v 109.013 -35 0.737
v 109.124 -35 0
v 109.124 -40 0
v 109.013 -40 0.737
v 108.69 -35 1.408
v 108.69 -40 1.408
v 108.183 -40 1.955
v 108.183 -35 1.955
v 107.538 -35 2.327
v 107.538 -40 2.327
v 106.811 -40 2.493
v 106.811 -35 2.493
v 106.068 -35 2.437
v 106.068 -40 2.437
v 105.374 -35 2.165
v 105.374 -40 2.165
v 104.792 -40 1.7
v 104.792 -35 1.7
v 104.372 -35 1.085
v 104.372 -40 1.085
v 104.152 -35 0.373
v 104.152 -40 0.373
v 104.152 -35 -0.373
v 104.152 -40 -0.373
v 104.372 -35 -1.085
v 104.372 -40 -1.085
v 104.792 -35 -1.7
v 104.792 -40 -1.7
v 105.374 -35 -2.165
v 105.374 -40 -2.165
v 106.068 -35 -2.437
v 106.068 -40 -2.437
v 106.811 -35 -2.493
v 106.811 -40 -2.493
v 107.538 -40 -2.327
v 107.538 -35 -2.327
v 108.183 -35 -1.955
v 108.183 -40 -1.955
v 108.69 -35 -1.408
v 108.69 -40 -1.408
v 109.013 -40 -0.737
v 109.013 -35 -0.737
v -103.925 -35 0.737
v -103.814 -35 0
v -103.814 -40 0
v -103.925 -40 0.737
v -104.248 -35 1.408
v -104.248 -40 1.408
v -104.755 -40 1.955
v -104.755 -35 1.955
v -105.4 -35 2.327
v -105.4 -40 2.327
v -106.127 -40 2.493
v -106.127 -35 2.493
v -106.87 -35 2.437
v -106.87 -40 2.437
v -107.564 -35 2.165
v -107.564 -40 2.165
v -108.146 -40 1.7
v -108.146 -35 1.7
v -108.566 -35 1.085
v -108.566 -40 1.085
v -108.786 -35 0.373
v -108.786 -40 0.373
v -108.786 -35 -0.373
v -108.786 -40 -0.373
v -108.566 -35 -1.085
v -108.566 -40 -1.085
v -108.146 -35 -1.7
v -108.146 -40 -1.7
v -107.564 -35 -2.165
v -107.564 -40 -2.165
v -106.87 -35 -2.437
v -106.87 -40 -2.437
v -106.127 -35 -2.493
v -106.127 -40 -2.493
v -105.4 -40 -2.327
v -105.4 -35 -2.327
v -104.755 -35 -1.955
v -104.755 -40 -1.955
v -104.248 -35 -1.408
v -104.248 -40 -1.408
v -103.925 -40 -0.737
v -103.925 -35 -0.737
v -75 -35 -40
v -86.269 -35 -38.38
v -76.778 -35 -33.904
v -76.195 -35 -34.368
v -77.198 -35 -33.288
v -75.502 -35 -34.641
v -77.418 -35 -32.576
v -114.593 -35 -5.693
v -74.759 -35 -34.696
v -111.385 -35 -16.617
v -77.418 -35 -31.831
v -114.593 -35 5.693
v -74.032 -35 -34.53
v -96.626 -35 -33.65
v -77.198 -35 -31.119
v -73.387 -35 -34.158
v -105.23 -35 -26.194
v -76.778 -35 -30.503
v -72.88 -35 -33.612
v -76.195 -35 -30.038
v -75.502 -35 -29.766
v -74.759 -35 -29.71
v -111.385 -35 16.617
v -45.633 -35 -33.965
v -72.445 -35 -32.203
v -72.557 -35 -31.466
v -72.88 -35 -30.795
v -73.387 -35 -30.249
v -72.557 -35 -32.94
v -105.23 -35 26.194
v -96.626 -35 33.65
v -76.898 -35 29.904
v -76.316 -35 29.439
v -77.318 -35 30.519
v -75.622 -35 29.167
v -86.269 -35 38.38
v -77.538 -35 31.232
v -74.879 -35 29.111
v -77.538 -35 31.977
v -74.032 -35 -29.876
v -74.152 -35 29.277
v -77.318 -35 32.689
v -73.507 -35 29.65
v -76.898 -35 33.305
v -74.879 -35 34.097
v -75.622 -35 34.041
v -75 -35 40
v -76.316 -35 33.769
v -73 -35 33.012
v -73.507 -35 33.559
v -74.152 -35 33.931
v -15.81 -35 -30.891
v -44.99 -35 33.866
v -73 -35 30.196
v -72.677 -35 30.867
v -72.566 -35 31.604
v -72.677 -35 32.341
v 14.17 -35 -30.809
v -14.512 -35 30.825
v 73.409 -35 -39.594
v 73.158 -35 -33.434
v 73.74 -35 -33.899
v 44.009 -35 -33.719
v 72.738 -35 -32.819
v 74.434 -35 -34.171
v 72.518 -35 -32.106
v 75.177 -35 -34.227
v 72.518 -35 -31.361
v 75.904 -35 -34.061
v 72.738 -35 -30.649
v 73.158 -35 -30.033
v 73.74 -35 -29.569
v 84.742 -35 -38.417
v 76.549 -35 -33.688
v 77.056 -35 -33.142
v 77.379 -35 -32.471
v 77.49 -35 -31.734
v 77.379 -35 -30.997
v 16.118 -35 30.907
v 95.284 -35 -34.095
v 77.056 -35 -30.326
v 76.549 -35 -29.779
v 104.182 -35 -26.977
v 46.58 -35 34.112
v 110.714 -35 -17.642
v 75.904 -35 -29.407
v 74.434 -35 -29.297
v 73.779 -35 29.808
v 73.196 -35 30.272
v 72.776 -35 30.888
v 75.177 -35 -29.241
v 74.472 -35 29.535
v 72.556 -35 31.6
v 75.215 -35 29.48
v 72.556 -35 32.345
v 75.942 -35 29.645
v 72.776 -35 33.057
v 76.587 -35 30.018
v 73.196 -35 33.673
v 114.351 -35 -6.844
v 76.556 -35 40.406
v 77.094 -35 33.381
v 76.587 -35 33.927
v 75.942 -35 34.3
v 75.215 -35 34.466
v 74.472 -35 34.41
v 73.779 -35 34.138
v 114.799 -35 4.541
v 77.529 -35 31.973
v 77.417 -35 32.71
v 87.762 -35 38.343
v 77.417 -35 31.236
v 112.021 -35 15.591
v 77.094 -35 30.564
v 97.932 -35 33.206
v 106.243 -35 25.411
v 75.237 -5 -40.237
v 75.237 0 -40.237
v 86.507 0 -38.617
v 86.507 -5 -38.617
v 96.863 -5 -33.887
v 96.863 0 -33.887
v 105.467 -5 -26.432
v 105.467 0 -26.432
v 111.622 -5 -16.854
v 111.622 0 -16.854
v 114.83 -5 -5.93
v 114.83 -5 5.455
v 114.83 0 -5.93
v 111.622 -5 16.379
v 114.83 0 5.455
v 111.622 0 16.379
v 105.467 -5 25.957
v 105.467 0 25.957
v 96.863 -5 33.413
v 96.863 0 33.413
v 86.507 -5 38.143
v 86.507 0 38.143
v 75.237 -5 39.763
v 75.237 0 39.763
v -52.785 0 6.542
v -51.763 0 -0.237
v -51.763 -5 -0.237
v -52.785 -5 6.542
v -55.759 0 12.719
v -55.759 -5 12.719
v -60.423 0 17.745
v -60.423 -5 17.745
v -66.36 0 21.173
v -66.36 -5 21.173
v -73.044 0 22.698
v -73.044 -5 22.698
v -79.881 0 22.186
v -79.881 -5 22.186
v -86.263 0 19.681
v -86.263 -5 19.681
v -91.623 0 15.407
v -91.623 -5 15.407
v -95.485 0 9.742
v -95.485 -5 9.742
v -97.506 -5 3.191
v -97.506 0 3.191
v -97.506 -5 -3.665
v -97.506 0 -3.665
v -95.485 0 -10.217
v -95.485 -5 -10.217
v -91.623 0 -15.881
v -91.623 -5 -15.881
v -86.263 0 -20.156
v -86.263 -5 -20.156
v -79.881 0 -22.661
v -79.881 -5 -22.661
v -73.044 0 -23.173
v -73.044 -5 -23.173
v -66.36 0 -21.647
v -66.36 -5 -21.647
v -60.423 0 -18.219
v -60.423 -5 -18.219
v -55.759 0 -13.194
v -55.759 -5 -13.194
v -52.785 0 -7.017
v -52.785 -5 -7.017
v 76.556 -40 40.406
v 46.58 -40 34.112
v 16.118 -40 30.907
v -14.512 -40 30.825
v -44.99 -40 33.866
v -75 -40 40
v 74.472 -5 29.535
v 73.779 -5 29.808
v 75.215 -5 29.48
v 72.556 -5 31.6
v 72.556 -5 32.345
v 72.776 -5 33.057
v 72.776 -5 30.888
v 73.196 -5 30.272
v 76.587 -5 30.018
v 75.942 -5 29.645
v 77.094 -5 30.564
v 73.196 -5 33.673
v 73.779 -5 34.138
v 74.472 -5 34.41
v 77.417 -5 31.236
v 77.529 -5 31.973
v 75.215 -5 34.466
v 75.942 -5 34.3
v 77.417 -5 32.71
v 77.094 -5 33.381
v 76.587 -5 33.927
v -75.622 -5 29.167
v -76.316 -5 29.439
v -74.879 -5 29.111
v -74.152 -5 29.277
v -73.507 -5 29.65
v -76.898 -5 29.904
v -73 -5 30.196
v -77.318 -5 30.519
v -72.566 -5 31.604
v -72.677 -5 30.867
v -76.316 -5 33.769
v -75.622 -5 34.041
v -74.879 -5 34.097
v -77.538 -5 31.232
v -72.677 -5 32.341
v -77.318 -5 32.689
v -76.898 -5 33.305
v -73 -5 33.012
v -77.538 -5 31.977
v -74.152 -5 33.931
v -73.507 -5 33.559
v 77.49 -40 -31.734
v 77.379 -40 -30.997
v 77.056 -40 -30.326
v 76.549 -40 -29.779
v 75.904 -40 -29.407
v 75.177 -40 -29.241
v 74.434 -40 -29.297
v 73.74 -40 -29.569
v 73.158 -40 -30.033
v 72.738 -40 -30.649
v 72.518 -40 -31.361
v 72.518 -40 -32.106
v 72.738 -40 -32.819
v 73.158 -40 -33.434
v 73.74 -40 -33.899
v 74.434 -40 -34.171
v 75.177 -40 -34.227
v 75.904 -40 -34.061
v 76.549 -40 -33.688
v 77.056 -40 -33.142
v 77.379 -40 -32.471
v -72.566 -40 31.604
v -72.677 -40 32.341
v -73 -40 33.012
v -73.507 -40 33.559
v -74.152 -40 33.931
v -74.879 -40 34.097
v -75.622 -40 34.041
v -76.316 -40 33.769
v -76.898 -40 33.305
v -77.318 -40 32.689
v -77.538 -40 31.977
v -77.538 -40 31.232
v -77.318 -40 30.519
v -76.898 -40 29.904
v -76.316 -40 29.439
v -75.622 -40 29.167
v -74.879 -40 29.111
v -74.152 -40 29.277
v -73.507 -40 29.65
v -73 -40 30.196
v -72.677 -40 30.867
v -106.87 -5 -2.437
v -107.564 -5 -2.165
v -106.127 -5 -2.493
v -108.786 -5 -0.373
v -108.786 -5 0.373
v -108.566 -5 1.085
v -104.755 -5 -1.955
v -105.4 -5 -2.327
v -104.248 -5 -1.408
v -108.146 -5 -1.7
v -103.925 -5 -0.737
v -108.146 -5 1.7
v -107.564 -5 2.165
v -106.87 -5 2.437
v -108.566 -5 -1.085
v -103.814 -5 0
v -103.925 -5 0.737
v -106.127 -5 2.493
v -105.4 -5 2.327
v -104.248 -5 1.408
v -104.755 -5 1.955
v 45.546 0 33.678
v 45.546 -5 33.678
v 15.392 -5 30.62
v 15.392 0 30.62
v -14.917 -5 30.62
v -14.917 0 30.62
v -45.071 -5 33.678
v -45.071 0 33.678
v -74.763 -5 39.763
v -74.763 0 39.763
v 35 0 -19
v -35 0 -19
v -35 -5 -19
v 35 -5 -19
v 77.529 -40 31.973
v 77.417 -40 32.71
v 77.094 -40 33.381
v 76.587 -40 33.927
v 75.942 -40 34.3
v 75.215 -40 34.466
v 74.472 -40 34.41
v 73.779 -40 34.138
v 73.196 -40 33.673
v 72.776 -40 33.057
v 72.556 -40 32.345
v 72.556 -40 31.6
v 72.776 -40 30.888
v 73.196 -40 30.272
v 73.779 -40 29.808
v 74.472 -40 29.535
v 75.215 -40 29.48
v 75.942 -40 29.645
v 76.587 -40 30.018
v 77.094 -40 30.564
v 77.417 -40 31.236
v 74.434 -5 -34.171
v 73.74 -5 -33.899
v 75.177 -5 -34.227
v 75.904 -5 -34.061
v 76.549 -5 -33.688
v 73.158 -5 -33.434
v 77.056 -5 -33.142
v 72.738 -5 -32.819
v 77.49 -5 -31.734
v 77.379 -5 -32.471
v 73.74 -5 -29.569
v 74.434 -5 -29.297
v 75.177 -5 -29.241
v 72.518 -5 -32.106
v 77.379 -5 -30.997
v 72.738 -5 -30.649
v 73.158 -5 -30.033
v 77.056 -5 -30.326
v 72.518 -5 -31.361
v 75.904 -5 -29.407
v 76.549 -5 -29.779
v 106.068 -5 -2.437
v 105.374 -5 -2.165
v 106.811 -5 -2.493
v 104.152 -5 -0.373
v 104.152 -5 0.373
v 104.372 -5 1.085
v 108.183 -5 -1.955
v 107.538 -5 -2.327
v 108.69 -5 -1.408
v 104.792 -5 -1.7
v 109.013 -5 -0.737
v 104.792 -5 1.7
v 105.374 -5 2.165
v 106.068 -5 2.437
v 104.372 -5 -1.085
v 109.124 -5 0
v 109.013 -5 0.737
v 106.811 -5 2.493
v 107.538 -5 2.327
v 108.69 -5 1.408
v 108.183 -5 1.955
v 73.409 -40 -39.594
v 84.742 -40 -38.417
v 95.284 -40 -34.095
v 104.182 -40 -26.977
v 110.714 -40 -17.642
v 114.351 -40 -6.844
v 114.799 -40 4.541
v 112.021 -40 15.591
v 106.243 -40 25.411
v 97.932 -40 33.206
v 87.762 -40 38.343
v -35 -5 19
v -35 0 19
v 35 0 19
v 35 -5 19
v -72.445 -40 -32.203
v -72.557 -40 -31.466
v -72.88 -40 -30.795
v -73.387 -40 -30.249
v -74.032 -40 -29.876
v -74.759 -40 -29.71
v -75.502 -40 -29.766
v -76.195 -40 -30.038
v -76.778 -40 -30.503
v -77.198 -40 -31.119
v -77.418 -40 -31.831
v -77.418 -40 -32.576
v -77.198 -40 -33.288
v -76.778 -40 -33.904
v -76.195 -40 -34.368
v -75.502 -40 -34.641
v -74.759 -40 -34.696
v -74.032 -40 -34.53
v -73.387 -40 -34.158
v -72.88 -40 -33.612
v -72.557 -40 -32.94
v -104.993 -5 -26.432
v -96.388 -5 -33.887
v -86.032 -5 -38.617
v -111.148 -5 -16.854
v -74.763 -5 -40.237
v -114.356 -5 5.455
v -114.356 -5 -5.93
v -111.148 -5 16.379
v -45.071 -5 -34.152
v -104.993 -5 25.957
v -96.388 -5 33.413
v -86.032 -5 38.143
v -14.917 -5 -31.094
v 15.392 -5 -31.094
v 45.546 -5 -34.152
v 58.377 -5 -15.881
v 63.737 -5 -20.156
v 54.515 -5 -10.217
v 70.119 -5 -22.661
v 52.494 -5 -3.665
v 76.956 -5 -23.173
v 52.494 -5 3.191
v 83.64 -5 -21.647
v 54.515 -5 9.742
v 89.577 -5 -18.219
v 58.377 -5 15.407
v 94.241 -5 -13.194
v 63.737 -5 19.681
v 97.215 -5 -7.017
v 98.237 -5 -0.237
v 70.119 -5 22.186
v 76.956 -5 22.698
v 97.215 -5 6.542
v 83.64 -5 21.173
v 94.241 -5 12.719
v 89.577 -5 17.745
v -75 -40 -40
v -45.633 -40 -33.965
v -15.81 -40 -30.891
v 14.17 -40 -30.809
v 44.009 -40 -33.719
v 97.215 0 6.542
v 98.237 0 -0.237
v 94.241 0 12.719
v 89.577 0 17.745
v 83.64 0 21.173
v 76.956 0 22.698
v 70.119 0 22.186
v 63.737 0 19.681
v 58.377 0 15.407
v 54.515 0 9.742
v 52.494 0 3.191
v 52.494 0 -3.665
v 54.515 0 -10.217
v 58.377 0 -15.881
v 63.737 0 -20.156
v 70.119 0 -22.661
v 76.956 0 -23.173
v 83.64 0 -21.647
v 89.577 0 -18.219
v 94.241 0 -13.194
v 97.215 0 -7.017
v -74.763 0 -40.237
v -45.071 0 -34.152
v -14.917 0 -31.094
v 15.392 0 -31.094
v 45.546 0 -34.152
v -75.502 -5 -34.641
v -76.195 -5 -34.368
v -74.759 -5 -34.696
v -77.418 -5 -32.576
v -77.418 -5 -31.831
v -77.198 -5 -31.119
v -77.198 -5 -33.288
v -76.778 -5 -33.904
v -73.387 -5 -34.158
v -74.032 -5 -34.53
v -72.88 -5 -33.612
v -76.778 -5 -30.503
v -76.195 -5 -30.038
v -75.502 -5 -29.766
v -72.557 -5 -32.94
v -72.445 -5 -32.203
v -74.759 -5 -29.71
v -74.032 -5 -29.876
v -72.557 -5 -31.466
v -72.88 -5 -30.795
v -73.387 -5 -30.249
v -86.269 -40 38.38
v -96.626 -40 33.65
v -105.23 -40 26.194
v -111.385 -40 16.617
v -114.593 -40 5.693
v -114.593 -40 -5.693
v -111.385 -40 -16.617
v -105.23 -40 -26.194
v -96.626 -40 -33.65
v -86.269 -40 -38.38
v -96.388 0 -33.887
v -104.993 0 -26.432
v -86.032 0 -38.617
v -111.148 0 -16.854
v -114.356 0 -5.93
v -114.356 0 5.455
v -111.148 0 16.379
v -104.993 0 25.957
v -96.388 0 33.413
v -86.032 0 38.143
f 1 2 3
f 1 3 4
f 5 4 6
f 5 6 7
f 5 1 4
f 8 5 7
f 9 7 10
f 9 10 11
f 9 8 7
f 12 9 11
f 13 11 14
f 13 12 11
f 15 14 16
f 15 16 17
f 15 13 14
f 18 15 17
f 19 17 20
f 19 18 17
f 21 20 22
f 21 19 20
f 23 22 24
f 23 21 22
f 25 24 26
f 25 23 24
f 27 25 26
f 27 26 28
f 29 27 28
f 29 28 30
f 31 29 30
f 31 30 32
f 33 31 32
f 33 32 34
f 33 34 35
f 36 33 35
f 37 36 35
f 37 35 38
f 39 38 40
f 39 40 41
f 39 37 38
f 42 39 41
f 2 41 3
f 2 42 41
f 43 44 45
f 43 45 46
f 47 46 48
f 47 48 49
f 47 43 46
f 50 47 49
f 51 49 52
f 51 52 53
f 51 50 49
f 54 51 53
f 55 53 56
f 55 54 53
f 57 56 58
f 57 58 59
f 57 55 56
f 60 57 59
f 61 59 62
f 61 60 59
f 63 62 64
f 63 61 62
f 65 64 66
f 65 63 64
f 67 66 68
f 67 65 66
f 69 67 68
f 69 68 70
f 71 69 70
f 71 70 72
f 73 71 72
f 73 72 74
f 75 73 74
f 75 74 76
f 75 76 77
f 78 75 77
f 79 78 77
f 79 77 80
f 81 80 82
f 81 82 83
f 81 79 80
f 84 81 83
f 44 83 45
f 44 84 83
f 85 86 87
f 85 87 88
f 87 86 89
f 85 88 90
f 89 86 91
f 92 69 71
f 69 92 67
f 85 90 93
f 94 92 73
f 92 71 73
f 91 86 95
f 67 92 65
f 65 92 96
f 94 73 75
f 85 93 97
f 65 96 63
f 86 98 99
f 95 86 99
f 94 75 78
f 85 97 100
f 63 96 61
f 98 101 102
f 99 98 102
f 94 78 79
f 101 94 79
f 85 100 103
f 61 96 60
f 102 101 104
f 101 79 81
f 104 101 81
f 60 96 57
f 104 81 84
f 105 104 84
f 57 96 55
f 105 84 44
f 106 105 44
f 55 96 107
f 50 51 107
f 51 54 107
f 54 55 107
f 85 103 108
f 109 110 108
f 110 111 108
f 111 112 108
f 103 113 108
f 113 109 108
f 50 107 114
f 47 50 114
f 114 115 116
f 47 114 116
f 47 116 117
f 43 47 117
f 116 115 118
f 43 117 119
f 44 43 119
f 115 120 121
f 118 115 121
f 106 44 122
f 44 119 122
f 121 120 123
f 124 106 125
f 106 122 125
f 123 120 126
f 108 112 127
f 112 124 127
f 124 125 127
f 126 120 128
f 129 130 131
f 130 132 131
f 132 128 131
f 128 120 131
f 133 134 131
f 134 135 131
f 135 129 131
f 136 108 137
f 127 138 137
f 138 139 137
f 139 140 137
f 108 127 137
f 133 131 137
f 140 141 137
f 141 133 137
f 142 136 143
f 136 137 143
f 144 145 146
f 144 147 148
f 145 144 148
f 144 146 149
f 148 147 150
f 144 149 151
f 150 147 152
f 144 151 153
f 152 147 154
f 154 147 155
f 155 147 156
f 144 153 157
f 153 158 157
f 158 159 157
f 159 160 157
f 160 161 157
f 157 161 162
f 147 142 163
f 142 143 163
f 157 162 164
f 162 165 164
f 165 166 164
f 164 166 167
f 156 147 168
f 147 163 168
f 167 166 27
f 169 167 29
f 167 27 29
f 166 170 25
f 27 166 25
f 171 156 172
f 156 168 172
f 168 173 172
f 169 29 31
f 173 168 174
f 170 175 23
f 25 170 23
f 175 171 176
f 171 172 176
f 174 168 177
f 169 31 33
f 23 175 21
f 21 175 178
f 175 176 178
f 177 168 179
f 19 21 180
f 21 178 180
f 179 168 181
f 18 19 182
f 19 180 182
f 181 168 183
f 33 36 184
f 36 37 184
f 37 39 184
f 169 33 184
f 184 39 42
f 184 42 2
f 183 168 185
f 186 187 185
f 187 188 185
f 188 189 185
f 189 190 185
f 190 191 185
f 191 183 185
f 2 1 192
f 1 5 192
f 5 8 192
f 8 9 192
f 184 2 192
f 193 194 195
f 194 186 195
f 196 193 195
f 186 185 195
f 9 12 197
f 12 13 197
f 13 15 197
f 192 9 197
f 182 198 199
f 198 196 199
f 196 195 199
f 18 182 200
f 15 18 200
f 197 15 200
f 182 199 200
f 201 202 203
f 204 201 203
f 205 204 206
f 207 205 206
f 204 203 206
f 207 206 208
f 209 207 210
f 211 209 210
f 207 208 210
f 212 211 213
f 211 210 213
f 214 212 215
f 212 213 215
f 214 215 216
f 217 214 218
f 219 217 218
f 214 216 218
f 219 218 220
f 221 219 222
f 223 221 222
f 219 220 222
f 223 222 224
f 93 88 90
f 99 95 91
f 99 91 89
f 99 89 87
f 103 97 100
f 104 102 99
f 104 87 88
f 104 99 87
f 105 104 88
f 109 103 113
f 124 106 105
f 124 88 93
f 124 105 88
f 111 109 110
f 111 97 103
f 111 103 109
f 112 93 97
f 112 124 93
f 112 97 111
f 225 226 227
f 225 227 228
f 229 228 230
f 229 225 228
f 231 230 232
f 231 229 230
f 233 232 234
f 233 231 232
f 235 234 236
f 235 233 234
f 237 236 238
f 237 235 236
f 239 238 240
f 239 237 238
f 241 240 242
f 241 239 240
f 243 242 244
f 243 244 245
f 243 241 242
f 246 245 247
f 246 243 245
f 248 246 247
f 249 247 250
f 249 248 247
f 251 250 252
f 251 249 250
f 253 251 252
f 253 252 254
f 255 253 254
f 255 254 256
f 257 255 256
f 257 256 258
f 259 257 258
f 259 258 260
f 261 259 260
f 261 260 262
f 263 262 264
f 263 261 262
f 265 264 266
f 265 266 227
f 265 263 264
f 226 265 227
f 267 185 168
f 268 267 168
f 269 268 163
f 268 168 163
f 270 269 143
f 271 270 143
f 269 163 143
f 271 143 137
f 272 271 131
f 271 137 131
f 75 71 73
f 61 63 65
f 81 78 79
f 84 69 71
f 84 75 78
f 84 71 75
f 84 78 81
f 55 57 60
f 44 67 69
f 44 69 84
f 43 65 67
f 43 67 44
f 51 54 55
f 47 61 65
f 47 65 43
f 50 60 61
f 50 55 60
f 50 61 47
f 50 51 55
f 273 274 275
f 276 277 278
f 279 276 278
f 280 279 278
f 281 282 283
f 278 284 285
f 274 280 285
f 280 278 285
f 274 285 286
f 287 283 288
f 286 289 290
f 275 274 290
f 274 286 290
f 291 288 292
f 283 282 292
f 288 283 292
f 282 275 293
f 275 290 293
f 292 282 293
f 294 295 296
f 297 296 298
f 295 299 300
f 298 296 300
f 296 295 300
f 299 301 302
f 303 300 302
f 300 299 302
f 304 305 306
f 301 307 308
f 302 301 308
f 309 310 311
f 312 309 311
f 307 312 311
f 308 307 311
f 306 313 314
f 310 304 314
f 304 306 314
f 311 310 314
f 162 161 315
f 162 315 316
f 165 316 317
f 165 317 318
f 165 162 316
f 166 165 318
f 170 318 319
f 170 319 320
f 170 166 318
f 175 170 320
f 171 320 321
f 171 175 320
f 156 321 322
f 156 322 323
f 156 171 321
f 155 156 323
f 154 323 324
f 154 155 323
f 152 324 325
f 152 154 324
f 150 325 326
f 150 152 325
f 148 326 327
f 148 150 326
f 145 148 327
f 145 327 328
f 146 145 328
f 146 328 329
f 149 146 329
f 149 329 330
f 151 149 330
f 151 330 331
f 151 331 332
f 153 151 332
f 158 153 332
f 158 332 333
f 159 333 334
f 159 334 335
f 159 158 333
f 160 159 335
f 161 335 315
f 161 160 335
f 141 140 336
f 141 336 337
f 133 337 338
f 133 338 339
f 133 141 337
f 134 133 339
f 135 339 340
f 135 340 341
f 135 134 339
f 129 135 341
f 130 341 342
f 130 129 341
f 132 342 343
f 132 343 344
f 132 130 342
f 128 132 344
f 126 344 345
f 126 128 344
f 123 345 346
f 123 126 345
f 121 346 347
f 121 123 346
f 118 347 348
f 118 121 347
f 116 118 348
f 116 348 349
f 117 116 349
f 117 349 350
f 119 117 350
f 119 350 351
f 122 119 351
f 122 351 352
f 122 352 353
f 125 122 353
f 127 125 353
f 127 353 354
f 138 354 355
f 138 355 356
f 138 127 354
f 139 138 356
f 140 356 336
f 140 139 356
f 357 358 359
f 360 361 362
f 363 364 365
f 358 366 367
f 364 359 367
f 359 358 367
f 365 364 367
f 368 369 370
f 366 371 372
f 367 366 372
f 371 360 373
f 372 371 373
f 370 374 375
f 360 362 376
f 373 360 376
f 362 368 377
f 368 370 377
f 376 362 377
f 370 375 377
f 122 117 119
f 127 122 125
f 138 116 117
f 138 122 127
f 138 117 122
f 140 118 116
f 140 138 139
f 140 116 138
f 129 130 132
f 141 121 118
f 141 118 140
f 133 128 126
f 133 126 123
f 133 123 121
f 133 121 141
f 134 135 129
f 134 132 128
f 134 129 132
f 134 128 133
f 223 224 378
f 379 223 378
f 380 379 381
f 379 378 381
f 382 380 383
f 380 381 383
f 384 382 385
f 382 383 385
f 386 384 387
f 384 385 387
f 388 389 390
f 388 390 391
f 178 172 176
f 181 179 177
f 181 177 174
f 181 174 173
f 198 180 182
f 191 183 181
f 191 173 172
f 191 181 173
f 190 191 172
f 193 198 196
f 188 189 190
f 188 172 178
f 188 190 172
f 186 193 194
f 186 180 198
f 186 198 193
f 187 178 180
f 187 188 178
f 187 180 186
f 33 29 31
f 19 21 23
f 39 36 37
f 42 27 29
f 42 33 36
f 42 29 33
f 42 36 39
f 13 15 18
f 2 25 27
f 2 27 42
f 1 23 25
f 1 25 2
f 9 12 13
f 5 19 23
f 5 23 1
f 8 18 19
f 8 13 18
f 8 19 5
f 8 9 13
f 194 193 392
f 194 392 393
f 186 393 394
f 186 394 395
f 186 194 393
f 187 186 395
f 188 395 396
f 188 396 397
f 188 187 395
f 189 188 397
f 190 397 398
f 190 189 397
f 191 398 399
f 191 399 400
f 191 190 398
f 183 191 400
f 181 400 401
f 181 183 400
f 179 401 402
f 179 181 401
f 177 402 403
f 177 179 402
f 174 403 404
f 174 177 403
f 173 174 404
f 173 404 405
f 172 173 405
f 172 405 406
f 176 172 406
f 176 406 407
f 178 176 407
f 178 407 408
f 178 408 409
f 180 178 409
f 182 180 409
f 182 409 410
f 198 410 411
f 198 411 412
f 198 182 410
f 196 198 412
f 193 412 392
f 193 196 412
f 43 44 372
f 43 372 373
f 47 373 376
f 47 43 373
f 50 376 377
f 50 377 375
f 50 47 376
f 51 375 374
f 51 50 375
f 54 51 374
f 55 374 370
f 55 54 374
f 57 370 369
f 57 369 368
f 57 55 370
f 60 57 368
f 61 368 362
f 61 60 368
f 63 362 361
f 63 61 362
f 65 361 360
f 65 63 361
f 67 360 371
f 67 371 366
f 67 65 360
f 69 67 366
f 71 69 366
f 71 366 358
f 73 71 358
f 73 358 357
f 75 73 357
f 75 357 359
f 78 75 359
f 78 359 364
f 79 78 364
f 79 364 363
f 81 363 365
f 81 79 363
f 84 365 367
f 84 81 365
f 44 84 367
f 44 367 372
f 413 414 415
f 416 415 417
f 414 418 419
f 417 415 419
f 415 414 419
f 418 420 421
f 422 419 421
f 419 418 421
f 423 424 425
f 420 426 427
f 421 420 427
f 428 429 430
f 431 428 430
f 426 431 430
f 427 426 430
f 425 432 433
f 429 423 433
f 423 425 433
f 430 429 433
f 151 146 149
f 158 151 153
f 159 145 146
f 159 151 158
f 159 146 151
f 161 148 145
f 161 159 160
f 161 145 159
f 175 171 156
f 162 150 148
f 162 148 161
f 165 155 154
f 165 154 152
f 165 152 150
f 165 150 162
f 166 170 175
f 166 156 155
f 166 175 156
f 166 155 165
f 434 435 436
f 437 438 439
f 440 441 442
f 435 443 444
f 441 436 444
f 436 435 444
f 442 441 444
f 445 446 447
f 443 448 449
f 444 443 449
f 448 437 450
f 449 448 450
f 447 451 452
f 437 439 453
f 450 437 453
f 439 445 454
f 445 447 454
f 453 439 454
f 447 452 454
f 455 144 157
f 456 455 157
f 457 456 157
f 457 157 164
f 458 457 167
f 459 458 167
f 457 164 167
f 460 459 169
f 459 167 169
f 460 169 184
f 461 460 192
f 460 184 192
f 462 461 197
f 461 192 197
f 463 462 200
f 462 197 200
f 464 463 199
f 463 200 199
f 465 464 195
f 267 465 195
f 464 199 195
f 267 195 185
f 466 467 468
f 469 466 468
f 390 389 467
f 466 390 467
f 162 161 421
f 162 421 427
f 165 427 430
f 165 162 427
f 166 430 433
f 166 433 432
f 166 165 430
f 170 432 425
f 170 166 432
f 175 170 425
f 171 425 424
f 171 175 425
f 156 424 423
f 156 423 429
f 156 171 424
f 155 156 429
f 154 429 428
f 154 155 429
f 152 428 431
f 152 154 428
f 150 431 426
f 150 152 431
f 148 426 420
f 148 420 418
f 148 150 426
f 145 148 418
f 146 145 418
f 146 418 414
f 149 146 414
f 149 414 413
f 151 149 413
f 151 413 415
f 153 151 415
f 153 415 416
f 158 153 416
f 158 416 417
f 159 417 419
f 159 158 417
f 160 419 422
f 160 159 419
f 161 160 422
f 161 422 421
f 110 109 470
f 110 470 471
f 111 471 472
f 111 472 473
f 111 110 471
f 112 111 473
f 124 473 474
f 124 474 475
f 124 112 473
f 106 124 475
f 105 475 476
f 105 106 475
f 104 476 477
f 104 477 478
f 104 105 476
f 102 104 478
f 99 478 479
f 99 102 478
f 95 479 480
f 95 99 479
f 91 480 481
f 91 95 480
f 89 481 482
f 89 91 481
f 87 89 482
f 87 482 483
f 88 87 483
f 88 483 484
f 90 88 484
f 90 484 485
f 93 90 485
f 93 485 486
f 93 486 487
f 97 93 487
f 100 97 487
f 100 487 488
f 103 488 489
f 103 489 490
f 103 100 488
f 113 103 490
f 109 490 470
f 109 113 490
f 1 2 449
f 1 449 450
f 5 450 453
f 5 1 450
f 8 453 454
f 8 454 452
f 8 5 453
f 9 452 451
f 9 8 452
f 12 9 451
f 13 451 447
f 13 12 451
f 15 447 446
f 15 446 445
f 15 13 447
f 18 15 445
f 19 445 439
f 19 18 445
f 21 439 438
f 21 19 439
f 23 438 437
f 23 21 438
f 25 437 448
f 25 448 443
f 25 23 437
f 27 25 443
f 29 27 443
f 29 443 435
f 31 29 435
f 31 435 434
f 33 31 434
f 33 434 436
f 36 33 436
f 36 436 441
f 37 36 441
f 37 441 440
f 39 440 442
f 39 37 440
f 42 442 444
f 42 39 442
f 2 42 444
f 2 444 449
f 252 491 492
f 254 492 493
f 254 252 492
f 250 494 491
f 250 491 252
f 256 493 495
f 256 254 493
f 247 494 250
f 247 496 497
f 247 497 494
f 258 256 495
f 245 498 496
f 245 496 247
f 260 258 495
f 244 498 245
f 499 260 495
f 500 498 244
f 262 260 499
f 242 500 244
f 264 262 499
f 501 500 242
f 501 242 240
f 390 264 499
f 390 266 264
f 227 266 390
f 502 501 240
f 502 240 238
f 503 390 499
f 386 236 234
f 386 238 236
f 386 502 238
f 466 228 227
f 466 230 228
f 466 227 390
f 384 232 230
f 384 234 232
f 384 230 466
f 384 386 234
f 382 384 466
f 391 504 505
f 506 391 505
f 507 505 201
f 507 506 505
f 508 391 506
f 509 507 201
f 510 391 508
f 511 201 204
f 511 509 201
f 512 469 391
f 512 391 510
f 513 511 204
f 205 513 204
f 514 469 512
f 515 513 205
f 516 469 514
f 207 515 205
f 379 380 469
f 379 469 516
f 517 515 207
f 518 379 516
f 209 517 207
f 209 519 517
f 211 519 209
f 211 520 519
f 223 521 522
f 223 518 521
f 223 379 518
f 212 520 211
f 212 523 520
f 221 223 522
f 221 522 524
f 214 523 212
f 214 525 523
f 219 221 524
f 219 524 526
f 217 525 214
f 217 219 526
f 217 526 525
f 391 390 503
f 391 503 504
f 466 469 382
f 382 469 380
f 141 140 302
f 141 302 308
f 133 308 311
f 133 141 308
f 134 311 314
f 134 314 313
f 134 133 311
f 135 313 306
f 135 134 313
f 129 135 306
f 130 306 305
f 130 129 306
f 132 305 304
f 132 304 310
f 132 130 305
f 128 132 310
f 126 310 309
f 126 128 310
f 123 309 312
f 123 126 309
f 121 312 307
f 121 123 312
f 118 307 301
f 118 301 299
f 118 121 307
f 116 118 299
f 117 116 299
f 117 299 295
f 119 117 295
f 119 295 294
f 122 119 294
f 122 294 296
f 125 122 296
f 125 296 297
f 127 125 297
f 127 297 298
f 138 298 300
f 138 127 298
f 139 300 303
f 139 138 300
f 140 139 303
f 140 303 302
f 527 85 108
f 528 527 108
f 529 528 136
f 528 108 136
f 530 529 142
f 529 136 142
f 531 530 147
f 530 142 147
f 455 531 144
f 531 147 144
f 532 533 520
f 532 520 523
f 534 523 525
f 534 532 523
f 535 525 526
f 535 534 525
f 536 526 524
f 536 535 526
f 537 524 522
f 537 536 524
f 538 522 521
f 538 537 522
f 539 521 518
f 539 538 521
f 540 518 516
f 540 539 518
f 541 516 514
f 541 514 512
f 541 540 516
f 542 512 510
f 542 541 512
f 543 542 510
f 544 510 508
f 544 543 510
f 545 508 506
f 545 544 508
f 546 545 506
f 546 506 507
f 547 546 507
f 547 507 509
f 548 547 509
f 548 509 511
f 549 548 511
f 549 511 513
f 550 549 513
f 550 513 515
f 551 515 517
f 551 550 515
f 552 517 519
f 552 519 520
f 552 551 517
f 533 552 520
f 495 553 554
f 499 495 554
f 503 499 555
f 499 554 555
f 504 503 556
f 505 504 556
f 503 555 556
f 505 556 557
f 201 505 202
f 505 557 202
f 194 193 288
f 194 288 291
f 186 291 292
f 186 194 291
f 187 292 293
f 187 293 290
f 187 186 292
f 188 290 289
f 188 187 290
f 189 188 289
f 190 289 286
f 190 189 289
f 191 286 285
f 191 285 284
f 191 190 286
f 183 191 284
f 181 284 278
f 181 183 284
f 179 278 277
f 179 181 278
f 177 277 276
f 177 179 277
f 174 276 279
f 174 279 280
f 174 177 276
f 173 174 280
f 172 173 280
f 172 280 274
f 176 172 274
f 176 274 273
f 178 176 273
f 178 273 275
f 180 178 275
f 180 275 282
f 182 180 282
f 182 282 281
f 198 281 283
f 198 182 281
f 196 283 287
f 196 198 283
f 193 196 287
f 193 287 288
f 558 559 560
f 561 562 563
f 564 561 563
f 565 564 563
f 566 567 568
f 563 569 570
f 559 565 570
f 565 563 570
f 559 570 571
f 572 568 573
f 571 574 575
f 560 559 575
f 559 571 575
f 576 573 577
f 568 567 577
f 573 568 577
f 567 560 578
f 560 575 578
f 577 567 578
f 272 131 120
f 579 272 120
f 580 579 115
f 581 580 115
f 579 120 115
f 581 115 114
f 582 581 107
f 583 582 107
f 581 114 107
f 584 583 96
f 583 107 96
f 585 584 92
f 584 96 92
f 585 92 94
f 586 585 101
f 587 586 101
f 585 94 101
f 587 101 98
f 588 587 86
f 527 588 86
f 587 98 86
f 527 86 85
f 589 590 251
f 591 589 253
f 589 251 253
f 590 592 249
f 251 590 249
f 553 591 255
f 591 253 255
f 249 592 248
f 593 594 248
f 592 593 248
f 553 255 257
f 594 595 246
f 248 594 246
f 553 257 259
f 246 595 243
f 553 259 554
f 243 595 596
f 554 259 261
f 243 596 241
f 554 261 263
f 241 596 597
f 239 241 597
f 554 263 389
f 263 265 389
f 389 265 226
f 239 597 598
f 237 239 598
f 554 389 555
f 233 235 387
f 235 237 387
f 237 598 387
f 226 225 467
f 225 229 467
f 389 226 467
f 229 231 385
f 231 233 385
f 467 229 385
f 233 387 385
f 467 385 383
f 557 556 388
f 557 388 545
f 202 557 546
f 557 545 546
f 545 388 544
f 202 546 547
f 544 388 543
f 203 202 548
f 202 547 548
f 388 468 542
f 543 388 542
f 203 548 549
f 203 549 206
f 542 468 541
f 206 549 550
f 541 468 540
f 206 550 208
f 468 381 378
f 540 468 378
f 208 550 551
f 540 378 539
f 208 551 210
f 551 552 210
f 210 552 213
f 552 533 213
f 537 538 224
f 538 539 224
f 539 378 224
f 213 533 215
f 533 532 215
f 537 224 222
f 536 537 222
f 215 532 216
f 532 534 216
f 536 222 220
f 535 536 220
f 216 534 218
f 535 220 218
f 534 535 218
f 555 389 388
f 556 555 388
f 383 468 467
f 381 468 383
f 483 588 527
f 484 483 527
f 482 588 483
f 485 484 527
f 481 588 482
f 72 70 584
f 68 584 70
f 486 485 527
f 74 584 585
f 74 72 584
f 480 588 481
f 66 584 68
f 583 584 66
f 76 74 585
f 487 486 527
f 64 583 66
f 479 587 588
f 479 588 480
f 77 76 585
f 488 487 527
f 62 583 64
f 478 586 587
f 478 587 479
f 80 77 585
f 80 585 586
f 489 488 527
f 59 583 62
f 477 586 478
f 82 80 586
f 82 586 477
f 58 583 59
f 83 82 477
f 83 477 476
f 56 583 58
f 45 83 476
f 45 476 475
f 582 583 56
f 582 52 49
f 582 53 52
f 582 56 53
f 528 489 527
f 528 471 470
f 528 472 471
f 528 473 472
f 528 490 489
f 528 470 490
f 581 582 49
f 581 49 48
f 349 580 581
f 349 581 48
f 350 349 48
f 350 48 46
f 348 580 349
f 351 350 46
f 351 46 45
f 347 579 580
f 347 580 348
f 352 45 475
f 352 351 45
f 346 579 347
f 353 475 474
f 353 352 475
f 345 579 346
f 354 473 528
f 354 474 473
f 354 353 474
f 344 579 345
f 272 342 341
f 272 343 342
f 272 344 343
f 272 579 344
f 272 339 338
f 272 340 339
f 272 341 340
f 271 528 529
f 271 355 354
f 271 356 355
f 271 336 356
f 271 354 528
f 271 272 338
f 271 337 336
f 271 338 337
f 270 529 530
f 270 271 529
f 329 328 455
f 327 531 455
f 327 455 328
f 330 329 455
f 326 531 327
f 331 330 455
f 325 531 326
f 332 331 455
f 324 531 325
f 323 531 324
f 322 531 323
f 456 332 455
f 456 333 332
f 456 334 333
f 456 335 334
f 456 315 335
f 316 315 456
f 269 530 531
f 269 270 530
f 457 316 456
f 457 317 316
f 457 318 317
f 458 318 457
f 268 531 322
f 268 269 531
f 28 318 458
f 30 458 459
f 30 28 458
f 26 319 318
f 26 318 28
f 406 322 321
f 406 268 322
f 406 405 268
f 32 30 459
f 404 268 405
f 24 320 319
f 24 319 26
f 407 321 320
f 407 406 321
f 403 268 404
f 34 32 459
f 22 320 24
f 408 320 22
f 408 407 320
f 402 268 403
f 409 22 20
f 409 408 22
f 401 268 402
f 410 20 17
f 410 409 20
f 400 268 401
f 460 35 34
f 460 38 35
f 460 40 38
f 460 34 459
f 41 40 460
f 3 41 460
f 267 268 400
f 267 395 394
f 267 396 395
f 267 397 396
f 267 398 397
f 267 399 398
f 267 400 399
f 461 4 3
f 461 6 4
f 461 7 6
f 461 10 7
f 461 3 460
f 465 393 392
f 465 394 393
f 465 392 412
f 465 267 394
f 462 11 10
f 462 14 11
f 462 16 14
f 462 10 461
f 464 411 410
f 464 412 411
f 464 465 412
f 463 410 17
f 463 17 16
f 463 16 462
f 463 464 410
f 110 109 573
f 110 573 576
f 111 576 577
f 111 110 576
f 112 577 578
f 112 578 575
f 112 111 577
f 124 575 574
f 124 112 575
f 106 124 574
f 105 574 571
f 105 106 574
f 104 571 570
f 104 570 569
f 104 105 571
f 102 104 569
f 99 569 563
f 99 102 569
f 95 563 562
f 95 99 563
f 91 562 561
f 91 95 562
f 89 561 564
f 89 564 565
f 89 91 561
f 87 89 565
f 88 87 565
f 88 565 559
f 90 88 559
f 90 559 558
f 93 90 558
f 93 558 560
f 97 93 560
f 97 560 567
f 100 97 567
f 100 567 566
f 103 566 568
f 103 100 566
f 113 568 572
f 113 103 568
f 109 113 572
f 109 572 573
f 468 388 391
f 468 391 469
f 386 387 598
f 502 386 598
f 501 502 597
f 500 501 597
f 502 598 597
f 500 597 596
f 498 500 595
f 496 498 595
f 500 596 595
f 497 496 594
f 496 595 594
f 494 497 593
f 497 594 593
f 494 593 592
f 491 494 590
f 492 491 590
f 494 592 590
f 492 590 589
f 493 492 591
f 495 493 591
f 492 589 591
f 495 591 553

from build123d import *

# Parameters (mm, degrees)
F0_R     = 23
F0_W     = 70
F0_H     = 38
F1_DEPTH = 5
F3_R     = 2.5
F4_DEPTH = 5
F5_DEPTH = 30


with BuildPart() as f1:
    # F0 (on Front) → F1 (new body)
    with BuildSketch(Plane.XZ):
        with BuildLine():
            ThreePointArc((-74.7628004057, -40.2371987939), (0.2371995943, -30.7109497595), (75.2371995943, -40.2371987939))
            ThreePointArc((75.2371995943, -40.2371987939), (115.2371995943, -0.2371987939), (75.2371995943, 39.7628012061))
            ThreePointArc((75.2371995943, 39.7628012061), (0.2371995943, 30.2365521716), (-74.7628004057, 39.7628012061))
            ThreePointArc((-74.7628004057, 39.7628012061), (-114.7628004057, -0.2371987939), (-74.7628004057, -40.2371987939))
        make_face()
        with Locations((75.2371995943, -0.2371987939)):
            Circle(F0_R, mode=Mode.SUBTRACT)
        with Locations((-74.7628004057, -0.2371987939)):
            Circle(F0_R, mode=Mode.SUBTRACT)
        Rectangle(F0_W, F0_H, mode=Mode.SUBTRACT)
    extrude(amount=F1_DEPTH)


with BuildPart() as f4:
    # F3 (on offset) → F4 (new body)
    with BuildSketch(Plane.XZ.offset(35)):
        with BuildLine():
            ThreePointArc((-75.0000307412, -40.0000089742), (-0.8211479846, -30.4748836644), (73.4087647878, -39.593804049))
            ThreePointArc((73.4087647878, -39.593804049), (114.9823591797, -1.1673984409), (76.5559535716, 40.406195951))
            ThreePointArc((76.5559535716, 40.406195951), (0.8040354288, 30.4748195307), (-75.0000307412, 39.9999910258))
            ThreePointArc((-75.0000307412, 39.9999910258), (-115.0000307412, -8.9742e-06), (-75.0000307412, -40.0000089742))
        make_face()
        with Locations((-74.9454423785, -32.203219831)):
            Circle(F3_R, mode=Mode.SUBTRACT)
        with Locations((-106.3136458397, 0)):
            Circle(F3_R, mode=Mode.SUBTRACT)
        with Locations((74.9903470278, -31.7338556051)):
            Circle(F3_R, mode=Mode.SUBTRACT)
        with Locations((106.6243350506, 0)):
            Circle(F3_R, mode=Mode.SUBTRACT)
        with Locations((-75.0656053424, 31.6041447222)):
            Circle(F3_R, mode=Mode.SUBTRACT)
        with Locations((75.0285089016, 31.9726653397)):
            Circle(F3_R, mode=Mode.SUBTRACT)
    extrude(amount=F4_DEPTH)


with BuildPart() as f5:
    # F3 (on offset) → F5 (new body)
    with BuildSketch(Plane.XZ.offset(35)):
        with Locations((-75.0656053424, 31.6041447222)):
            Circle(F3_R)
    extrude(amount=-F5_DEPTH)


with BuildPart() as f5b:
    # F3 (on offset) → F5, piece 2 (new body)
    with BuildSketch(Plane.XZ.offset(35)):
        with Locations((-106.3136458397, 0)):
            Circle(F3_R)
    extrude(amount=-F5_DEPTH)


with BuildPart() as f5c:
    # F3 (on offset) → F5, piece 3 (new body)
    with BuildSketch(Plane.XZ.offset(35)):
        with Locations((-74.9454423785, -32.203219831)):
            Circle(F3_R)
    extrude(amount=-F5_DEPTH)


with BuildPart() as f5d:
    # F3 (on offset) → F5, piece 4 (new body)
    with BuildSketch(Plane.XZ.offset(35)):
        with Locations((75.0285089016, 31.9726653397)):
            Circle(F3_R)
    extrude(amount=-F5_DEPTH)


with BuildPart() as f5e:
    # F3 (on offset) → F5, piece 5 (new body)
    with BuildSketch(Plane.XZ.offset(35)):
        with Locations((106.6243350506, 0)):
            Circle(F3_R)
    extrude(amount=-F5_DEPTH)


with BuildPart() as f5f:
    # F3 (on offset) → F5, piece 6 (new body)
    with BuildSketch(Plane.XZ.offset(35)):
        with Locations((74.9903470278, -31.7338556051)):
            Circle(F3_R)
    extrude(amount=-F5_DEPTH)


solid = Compound([f1.part, f4.part, f5.part, f5b.part, f5c.part, f5d.part, f5e.part, f5f.part])
